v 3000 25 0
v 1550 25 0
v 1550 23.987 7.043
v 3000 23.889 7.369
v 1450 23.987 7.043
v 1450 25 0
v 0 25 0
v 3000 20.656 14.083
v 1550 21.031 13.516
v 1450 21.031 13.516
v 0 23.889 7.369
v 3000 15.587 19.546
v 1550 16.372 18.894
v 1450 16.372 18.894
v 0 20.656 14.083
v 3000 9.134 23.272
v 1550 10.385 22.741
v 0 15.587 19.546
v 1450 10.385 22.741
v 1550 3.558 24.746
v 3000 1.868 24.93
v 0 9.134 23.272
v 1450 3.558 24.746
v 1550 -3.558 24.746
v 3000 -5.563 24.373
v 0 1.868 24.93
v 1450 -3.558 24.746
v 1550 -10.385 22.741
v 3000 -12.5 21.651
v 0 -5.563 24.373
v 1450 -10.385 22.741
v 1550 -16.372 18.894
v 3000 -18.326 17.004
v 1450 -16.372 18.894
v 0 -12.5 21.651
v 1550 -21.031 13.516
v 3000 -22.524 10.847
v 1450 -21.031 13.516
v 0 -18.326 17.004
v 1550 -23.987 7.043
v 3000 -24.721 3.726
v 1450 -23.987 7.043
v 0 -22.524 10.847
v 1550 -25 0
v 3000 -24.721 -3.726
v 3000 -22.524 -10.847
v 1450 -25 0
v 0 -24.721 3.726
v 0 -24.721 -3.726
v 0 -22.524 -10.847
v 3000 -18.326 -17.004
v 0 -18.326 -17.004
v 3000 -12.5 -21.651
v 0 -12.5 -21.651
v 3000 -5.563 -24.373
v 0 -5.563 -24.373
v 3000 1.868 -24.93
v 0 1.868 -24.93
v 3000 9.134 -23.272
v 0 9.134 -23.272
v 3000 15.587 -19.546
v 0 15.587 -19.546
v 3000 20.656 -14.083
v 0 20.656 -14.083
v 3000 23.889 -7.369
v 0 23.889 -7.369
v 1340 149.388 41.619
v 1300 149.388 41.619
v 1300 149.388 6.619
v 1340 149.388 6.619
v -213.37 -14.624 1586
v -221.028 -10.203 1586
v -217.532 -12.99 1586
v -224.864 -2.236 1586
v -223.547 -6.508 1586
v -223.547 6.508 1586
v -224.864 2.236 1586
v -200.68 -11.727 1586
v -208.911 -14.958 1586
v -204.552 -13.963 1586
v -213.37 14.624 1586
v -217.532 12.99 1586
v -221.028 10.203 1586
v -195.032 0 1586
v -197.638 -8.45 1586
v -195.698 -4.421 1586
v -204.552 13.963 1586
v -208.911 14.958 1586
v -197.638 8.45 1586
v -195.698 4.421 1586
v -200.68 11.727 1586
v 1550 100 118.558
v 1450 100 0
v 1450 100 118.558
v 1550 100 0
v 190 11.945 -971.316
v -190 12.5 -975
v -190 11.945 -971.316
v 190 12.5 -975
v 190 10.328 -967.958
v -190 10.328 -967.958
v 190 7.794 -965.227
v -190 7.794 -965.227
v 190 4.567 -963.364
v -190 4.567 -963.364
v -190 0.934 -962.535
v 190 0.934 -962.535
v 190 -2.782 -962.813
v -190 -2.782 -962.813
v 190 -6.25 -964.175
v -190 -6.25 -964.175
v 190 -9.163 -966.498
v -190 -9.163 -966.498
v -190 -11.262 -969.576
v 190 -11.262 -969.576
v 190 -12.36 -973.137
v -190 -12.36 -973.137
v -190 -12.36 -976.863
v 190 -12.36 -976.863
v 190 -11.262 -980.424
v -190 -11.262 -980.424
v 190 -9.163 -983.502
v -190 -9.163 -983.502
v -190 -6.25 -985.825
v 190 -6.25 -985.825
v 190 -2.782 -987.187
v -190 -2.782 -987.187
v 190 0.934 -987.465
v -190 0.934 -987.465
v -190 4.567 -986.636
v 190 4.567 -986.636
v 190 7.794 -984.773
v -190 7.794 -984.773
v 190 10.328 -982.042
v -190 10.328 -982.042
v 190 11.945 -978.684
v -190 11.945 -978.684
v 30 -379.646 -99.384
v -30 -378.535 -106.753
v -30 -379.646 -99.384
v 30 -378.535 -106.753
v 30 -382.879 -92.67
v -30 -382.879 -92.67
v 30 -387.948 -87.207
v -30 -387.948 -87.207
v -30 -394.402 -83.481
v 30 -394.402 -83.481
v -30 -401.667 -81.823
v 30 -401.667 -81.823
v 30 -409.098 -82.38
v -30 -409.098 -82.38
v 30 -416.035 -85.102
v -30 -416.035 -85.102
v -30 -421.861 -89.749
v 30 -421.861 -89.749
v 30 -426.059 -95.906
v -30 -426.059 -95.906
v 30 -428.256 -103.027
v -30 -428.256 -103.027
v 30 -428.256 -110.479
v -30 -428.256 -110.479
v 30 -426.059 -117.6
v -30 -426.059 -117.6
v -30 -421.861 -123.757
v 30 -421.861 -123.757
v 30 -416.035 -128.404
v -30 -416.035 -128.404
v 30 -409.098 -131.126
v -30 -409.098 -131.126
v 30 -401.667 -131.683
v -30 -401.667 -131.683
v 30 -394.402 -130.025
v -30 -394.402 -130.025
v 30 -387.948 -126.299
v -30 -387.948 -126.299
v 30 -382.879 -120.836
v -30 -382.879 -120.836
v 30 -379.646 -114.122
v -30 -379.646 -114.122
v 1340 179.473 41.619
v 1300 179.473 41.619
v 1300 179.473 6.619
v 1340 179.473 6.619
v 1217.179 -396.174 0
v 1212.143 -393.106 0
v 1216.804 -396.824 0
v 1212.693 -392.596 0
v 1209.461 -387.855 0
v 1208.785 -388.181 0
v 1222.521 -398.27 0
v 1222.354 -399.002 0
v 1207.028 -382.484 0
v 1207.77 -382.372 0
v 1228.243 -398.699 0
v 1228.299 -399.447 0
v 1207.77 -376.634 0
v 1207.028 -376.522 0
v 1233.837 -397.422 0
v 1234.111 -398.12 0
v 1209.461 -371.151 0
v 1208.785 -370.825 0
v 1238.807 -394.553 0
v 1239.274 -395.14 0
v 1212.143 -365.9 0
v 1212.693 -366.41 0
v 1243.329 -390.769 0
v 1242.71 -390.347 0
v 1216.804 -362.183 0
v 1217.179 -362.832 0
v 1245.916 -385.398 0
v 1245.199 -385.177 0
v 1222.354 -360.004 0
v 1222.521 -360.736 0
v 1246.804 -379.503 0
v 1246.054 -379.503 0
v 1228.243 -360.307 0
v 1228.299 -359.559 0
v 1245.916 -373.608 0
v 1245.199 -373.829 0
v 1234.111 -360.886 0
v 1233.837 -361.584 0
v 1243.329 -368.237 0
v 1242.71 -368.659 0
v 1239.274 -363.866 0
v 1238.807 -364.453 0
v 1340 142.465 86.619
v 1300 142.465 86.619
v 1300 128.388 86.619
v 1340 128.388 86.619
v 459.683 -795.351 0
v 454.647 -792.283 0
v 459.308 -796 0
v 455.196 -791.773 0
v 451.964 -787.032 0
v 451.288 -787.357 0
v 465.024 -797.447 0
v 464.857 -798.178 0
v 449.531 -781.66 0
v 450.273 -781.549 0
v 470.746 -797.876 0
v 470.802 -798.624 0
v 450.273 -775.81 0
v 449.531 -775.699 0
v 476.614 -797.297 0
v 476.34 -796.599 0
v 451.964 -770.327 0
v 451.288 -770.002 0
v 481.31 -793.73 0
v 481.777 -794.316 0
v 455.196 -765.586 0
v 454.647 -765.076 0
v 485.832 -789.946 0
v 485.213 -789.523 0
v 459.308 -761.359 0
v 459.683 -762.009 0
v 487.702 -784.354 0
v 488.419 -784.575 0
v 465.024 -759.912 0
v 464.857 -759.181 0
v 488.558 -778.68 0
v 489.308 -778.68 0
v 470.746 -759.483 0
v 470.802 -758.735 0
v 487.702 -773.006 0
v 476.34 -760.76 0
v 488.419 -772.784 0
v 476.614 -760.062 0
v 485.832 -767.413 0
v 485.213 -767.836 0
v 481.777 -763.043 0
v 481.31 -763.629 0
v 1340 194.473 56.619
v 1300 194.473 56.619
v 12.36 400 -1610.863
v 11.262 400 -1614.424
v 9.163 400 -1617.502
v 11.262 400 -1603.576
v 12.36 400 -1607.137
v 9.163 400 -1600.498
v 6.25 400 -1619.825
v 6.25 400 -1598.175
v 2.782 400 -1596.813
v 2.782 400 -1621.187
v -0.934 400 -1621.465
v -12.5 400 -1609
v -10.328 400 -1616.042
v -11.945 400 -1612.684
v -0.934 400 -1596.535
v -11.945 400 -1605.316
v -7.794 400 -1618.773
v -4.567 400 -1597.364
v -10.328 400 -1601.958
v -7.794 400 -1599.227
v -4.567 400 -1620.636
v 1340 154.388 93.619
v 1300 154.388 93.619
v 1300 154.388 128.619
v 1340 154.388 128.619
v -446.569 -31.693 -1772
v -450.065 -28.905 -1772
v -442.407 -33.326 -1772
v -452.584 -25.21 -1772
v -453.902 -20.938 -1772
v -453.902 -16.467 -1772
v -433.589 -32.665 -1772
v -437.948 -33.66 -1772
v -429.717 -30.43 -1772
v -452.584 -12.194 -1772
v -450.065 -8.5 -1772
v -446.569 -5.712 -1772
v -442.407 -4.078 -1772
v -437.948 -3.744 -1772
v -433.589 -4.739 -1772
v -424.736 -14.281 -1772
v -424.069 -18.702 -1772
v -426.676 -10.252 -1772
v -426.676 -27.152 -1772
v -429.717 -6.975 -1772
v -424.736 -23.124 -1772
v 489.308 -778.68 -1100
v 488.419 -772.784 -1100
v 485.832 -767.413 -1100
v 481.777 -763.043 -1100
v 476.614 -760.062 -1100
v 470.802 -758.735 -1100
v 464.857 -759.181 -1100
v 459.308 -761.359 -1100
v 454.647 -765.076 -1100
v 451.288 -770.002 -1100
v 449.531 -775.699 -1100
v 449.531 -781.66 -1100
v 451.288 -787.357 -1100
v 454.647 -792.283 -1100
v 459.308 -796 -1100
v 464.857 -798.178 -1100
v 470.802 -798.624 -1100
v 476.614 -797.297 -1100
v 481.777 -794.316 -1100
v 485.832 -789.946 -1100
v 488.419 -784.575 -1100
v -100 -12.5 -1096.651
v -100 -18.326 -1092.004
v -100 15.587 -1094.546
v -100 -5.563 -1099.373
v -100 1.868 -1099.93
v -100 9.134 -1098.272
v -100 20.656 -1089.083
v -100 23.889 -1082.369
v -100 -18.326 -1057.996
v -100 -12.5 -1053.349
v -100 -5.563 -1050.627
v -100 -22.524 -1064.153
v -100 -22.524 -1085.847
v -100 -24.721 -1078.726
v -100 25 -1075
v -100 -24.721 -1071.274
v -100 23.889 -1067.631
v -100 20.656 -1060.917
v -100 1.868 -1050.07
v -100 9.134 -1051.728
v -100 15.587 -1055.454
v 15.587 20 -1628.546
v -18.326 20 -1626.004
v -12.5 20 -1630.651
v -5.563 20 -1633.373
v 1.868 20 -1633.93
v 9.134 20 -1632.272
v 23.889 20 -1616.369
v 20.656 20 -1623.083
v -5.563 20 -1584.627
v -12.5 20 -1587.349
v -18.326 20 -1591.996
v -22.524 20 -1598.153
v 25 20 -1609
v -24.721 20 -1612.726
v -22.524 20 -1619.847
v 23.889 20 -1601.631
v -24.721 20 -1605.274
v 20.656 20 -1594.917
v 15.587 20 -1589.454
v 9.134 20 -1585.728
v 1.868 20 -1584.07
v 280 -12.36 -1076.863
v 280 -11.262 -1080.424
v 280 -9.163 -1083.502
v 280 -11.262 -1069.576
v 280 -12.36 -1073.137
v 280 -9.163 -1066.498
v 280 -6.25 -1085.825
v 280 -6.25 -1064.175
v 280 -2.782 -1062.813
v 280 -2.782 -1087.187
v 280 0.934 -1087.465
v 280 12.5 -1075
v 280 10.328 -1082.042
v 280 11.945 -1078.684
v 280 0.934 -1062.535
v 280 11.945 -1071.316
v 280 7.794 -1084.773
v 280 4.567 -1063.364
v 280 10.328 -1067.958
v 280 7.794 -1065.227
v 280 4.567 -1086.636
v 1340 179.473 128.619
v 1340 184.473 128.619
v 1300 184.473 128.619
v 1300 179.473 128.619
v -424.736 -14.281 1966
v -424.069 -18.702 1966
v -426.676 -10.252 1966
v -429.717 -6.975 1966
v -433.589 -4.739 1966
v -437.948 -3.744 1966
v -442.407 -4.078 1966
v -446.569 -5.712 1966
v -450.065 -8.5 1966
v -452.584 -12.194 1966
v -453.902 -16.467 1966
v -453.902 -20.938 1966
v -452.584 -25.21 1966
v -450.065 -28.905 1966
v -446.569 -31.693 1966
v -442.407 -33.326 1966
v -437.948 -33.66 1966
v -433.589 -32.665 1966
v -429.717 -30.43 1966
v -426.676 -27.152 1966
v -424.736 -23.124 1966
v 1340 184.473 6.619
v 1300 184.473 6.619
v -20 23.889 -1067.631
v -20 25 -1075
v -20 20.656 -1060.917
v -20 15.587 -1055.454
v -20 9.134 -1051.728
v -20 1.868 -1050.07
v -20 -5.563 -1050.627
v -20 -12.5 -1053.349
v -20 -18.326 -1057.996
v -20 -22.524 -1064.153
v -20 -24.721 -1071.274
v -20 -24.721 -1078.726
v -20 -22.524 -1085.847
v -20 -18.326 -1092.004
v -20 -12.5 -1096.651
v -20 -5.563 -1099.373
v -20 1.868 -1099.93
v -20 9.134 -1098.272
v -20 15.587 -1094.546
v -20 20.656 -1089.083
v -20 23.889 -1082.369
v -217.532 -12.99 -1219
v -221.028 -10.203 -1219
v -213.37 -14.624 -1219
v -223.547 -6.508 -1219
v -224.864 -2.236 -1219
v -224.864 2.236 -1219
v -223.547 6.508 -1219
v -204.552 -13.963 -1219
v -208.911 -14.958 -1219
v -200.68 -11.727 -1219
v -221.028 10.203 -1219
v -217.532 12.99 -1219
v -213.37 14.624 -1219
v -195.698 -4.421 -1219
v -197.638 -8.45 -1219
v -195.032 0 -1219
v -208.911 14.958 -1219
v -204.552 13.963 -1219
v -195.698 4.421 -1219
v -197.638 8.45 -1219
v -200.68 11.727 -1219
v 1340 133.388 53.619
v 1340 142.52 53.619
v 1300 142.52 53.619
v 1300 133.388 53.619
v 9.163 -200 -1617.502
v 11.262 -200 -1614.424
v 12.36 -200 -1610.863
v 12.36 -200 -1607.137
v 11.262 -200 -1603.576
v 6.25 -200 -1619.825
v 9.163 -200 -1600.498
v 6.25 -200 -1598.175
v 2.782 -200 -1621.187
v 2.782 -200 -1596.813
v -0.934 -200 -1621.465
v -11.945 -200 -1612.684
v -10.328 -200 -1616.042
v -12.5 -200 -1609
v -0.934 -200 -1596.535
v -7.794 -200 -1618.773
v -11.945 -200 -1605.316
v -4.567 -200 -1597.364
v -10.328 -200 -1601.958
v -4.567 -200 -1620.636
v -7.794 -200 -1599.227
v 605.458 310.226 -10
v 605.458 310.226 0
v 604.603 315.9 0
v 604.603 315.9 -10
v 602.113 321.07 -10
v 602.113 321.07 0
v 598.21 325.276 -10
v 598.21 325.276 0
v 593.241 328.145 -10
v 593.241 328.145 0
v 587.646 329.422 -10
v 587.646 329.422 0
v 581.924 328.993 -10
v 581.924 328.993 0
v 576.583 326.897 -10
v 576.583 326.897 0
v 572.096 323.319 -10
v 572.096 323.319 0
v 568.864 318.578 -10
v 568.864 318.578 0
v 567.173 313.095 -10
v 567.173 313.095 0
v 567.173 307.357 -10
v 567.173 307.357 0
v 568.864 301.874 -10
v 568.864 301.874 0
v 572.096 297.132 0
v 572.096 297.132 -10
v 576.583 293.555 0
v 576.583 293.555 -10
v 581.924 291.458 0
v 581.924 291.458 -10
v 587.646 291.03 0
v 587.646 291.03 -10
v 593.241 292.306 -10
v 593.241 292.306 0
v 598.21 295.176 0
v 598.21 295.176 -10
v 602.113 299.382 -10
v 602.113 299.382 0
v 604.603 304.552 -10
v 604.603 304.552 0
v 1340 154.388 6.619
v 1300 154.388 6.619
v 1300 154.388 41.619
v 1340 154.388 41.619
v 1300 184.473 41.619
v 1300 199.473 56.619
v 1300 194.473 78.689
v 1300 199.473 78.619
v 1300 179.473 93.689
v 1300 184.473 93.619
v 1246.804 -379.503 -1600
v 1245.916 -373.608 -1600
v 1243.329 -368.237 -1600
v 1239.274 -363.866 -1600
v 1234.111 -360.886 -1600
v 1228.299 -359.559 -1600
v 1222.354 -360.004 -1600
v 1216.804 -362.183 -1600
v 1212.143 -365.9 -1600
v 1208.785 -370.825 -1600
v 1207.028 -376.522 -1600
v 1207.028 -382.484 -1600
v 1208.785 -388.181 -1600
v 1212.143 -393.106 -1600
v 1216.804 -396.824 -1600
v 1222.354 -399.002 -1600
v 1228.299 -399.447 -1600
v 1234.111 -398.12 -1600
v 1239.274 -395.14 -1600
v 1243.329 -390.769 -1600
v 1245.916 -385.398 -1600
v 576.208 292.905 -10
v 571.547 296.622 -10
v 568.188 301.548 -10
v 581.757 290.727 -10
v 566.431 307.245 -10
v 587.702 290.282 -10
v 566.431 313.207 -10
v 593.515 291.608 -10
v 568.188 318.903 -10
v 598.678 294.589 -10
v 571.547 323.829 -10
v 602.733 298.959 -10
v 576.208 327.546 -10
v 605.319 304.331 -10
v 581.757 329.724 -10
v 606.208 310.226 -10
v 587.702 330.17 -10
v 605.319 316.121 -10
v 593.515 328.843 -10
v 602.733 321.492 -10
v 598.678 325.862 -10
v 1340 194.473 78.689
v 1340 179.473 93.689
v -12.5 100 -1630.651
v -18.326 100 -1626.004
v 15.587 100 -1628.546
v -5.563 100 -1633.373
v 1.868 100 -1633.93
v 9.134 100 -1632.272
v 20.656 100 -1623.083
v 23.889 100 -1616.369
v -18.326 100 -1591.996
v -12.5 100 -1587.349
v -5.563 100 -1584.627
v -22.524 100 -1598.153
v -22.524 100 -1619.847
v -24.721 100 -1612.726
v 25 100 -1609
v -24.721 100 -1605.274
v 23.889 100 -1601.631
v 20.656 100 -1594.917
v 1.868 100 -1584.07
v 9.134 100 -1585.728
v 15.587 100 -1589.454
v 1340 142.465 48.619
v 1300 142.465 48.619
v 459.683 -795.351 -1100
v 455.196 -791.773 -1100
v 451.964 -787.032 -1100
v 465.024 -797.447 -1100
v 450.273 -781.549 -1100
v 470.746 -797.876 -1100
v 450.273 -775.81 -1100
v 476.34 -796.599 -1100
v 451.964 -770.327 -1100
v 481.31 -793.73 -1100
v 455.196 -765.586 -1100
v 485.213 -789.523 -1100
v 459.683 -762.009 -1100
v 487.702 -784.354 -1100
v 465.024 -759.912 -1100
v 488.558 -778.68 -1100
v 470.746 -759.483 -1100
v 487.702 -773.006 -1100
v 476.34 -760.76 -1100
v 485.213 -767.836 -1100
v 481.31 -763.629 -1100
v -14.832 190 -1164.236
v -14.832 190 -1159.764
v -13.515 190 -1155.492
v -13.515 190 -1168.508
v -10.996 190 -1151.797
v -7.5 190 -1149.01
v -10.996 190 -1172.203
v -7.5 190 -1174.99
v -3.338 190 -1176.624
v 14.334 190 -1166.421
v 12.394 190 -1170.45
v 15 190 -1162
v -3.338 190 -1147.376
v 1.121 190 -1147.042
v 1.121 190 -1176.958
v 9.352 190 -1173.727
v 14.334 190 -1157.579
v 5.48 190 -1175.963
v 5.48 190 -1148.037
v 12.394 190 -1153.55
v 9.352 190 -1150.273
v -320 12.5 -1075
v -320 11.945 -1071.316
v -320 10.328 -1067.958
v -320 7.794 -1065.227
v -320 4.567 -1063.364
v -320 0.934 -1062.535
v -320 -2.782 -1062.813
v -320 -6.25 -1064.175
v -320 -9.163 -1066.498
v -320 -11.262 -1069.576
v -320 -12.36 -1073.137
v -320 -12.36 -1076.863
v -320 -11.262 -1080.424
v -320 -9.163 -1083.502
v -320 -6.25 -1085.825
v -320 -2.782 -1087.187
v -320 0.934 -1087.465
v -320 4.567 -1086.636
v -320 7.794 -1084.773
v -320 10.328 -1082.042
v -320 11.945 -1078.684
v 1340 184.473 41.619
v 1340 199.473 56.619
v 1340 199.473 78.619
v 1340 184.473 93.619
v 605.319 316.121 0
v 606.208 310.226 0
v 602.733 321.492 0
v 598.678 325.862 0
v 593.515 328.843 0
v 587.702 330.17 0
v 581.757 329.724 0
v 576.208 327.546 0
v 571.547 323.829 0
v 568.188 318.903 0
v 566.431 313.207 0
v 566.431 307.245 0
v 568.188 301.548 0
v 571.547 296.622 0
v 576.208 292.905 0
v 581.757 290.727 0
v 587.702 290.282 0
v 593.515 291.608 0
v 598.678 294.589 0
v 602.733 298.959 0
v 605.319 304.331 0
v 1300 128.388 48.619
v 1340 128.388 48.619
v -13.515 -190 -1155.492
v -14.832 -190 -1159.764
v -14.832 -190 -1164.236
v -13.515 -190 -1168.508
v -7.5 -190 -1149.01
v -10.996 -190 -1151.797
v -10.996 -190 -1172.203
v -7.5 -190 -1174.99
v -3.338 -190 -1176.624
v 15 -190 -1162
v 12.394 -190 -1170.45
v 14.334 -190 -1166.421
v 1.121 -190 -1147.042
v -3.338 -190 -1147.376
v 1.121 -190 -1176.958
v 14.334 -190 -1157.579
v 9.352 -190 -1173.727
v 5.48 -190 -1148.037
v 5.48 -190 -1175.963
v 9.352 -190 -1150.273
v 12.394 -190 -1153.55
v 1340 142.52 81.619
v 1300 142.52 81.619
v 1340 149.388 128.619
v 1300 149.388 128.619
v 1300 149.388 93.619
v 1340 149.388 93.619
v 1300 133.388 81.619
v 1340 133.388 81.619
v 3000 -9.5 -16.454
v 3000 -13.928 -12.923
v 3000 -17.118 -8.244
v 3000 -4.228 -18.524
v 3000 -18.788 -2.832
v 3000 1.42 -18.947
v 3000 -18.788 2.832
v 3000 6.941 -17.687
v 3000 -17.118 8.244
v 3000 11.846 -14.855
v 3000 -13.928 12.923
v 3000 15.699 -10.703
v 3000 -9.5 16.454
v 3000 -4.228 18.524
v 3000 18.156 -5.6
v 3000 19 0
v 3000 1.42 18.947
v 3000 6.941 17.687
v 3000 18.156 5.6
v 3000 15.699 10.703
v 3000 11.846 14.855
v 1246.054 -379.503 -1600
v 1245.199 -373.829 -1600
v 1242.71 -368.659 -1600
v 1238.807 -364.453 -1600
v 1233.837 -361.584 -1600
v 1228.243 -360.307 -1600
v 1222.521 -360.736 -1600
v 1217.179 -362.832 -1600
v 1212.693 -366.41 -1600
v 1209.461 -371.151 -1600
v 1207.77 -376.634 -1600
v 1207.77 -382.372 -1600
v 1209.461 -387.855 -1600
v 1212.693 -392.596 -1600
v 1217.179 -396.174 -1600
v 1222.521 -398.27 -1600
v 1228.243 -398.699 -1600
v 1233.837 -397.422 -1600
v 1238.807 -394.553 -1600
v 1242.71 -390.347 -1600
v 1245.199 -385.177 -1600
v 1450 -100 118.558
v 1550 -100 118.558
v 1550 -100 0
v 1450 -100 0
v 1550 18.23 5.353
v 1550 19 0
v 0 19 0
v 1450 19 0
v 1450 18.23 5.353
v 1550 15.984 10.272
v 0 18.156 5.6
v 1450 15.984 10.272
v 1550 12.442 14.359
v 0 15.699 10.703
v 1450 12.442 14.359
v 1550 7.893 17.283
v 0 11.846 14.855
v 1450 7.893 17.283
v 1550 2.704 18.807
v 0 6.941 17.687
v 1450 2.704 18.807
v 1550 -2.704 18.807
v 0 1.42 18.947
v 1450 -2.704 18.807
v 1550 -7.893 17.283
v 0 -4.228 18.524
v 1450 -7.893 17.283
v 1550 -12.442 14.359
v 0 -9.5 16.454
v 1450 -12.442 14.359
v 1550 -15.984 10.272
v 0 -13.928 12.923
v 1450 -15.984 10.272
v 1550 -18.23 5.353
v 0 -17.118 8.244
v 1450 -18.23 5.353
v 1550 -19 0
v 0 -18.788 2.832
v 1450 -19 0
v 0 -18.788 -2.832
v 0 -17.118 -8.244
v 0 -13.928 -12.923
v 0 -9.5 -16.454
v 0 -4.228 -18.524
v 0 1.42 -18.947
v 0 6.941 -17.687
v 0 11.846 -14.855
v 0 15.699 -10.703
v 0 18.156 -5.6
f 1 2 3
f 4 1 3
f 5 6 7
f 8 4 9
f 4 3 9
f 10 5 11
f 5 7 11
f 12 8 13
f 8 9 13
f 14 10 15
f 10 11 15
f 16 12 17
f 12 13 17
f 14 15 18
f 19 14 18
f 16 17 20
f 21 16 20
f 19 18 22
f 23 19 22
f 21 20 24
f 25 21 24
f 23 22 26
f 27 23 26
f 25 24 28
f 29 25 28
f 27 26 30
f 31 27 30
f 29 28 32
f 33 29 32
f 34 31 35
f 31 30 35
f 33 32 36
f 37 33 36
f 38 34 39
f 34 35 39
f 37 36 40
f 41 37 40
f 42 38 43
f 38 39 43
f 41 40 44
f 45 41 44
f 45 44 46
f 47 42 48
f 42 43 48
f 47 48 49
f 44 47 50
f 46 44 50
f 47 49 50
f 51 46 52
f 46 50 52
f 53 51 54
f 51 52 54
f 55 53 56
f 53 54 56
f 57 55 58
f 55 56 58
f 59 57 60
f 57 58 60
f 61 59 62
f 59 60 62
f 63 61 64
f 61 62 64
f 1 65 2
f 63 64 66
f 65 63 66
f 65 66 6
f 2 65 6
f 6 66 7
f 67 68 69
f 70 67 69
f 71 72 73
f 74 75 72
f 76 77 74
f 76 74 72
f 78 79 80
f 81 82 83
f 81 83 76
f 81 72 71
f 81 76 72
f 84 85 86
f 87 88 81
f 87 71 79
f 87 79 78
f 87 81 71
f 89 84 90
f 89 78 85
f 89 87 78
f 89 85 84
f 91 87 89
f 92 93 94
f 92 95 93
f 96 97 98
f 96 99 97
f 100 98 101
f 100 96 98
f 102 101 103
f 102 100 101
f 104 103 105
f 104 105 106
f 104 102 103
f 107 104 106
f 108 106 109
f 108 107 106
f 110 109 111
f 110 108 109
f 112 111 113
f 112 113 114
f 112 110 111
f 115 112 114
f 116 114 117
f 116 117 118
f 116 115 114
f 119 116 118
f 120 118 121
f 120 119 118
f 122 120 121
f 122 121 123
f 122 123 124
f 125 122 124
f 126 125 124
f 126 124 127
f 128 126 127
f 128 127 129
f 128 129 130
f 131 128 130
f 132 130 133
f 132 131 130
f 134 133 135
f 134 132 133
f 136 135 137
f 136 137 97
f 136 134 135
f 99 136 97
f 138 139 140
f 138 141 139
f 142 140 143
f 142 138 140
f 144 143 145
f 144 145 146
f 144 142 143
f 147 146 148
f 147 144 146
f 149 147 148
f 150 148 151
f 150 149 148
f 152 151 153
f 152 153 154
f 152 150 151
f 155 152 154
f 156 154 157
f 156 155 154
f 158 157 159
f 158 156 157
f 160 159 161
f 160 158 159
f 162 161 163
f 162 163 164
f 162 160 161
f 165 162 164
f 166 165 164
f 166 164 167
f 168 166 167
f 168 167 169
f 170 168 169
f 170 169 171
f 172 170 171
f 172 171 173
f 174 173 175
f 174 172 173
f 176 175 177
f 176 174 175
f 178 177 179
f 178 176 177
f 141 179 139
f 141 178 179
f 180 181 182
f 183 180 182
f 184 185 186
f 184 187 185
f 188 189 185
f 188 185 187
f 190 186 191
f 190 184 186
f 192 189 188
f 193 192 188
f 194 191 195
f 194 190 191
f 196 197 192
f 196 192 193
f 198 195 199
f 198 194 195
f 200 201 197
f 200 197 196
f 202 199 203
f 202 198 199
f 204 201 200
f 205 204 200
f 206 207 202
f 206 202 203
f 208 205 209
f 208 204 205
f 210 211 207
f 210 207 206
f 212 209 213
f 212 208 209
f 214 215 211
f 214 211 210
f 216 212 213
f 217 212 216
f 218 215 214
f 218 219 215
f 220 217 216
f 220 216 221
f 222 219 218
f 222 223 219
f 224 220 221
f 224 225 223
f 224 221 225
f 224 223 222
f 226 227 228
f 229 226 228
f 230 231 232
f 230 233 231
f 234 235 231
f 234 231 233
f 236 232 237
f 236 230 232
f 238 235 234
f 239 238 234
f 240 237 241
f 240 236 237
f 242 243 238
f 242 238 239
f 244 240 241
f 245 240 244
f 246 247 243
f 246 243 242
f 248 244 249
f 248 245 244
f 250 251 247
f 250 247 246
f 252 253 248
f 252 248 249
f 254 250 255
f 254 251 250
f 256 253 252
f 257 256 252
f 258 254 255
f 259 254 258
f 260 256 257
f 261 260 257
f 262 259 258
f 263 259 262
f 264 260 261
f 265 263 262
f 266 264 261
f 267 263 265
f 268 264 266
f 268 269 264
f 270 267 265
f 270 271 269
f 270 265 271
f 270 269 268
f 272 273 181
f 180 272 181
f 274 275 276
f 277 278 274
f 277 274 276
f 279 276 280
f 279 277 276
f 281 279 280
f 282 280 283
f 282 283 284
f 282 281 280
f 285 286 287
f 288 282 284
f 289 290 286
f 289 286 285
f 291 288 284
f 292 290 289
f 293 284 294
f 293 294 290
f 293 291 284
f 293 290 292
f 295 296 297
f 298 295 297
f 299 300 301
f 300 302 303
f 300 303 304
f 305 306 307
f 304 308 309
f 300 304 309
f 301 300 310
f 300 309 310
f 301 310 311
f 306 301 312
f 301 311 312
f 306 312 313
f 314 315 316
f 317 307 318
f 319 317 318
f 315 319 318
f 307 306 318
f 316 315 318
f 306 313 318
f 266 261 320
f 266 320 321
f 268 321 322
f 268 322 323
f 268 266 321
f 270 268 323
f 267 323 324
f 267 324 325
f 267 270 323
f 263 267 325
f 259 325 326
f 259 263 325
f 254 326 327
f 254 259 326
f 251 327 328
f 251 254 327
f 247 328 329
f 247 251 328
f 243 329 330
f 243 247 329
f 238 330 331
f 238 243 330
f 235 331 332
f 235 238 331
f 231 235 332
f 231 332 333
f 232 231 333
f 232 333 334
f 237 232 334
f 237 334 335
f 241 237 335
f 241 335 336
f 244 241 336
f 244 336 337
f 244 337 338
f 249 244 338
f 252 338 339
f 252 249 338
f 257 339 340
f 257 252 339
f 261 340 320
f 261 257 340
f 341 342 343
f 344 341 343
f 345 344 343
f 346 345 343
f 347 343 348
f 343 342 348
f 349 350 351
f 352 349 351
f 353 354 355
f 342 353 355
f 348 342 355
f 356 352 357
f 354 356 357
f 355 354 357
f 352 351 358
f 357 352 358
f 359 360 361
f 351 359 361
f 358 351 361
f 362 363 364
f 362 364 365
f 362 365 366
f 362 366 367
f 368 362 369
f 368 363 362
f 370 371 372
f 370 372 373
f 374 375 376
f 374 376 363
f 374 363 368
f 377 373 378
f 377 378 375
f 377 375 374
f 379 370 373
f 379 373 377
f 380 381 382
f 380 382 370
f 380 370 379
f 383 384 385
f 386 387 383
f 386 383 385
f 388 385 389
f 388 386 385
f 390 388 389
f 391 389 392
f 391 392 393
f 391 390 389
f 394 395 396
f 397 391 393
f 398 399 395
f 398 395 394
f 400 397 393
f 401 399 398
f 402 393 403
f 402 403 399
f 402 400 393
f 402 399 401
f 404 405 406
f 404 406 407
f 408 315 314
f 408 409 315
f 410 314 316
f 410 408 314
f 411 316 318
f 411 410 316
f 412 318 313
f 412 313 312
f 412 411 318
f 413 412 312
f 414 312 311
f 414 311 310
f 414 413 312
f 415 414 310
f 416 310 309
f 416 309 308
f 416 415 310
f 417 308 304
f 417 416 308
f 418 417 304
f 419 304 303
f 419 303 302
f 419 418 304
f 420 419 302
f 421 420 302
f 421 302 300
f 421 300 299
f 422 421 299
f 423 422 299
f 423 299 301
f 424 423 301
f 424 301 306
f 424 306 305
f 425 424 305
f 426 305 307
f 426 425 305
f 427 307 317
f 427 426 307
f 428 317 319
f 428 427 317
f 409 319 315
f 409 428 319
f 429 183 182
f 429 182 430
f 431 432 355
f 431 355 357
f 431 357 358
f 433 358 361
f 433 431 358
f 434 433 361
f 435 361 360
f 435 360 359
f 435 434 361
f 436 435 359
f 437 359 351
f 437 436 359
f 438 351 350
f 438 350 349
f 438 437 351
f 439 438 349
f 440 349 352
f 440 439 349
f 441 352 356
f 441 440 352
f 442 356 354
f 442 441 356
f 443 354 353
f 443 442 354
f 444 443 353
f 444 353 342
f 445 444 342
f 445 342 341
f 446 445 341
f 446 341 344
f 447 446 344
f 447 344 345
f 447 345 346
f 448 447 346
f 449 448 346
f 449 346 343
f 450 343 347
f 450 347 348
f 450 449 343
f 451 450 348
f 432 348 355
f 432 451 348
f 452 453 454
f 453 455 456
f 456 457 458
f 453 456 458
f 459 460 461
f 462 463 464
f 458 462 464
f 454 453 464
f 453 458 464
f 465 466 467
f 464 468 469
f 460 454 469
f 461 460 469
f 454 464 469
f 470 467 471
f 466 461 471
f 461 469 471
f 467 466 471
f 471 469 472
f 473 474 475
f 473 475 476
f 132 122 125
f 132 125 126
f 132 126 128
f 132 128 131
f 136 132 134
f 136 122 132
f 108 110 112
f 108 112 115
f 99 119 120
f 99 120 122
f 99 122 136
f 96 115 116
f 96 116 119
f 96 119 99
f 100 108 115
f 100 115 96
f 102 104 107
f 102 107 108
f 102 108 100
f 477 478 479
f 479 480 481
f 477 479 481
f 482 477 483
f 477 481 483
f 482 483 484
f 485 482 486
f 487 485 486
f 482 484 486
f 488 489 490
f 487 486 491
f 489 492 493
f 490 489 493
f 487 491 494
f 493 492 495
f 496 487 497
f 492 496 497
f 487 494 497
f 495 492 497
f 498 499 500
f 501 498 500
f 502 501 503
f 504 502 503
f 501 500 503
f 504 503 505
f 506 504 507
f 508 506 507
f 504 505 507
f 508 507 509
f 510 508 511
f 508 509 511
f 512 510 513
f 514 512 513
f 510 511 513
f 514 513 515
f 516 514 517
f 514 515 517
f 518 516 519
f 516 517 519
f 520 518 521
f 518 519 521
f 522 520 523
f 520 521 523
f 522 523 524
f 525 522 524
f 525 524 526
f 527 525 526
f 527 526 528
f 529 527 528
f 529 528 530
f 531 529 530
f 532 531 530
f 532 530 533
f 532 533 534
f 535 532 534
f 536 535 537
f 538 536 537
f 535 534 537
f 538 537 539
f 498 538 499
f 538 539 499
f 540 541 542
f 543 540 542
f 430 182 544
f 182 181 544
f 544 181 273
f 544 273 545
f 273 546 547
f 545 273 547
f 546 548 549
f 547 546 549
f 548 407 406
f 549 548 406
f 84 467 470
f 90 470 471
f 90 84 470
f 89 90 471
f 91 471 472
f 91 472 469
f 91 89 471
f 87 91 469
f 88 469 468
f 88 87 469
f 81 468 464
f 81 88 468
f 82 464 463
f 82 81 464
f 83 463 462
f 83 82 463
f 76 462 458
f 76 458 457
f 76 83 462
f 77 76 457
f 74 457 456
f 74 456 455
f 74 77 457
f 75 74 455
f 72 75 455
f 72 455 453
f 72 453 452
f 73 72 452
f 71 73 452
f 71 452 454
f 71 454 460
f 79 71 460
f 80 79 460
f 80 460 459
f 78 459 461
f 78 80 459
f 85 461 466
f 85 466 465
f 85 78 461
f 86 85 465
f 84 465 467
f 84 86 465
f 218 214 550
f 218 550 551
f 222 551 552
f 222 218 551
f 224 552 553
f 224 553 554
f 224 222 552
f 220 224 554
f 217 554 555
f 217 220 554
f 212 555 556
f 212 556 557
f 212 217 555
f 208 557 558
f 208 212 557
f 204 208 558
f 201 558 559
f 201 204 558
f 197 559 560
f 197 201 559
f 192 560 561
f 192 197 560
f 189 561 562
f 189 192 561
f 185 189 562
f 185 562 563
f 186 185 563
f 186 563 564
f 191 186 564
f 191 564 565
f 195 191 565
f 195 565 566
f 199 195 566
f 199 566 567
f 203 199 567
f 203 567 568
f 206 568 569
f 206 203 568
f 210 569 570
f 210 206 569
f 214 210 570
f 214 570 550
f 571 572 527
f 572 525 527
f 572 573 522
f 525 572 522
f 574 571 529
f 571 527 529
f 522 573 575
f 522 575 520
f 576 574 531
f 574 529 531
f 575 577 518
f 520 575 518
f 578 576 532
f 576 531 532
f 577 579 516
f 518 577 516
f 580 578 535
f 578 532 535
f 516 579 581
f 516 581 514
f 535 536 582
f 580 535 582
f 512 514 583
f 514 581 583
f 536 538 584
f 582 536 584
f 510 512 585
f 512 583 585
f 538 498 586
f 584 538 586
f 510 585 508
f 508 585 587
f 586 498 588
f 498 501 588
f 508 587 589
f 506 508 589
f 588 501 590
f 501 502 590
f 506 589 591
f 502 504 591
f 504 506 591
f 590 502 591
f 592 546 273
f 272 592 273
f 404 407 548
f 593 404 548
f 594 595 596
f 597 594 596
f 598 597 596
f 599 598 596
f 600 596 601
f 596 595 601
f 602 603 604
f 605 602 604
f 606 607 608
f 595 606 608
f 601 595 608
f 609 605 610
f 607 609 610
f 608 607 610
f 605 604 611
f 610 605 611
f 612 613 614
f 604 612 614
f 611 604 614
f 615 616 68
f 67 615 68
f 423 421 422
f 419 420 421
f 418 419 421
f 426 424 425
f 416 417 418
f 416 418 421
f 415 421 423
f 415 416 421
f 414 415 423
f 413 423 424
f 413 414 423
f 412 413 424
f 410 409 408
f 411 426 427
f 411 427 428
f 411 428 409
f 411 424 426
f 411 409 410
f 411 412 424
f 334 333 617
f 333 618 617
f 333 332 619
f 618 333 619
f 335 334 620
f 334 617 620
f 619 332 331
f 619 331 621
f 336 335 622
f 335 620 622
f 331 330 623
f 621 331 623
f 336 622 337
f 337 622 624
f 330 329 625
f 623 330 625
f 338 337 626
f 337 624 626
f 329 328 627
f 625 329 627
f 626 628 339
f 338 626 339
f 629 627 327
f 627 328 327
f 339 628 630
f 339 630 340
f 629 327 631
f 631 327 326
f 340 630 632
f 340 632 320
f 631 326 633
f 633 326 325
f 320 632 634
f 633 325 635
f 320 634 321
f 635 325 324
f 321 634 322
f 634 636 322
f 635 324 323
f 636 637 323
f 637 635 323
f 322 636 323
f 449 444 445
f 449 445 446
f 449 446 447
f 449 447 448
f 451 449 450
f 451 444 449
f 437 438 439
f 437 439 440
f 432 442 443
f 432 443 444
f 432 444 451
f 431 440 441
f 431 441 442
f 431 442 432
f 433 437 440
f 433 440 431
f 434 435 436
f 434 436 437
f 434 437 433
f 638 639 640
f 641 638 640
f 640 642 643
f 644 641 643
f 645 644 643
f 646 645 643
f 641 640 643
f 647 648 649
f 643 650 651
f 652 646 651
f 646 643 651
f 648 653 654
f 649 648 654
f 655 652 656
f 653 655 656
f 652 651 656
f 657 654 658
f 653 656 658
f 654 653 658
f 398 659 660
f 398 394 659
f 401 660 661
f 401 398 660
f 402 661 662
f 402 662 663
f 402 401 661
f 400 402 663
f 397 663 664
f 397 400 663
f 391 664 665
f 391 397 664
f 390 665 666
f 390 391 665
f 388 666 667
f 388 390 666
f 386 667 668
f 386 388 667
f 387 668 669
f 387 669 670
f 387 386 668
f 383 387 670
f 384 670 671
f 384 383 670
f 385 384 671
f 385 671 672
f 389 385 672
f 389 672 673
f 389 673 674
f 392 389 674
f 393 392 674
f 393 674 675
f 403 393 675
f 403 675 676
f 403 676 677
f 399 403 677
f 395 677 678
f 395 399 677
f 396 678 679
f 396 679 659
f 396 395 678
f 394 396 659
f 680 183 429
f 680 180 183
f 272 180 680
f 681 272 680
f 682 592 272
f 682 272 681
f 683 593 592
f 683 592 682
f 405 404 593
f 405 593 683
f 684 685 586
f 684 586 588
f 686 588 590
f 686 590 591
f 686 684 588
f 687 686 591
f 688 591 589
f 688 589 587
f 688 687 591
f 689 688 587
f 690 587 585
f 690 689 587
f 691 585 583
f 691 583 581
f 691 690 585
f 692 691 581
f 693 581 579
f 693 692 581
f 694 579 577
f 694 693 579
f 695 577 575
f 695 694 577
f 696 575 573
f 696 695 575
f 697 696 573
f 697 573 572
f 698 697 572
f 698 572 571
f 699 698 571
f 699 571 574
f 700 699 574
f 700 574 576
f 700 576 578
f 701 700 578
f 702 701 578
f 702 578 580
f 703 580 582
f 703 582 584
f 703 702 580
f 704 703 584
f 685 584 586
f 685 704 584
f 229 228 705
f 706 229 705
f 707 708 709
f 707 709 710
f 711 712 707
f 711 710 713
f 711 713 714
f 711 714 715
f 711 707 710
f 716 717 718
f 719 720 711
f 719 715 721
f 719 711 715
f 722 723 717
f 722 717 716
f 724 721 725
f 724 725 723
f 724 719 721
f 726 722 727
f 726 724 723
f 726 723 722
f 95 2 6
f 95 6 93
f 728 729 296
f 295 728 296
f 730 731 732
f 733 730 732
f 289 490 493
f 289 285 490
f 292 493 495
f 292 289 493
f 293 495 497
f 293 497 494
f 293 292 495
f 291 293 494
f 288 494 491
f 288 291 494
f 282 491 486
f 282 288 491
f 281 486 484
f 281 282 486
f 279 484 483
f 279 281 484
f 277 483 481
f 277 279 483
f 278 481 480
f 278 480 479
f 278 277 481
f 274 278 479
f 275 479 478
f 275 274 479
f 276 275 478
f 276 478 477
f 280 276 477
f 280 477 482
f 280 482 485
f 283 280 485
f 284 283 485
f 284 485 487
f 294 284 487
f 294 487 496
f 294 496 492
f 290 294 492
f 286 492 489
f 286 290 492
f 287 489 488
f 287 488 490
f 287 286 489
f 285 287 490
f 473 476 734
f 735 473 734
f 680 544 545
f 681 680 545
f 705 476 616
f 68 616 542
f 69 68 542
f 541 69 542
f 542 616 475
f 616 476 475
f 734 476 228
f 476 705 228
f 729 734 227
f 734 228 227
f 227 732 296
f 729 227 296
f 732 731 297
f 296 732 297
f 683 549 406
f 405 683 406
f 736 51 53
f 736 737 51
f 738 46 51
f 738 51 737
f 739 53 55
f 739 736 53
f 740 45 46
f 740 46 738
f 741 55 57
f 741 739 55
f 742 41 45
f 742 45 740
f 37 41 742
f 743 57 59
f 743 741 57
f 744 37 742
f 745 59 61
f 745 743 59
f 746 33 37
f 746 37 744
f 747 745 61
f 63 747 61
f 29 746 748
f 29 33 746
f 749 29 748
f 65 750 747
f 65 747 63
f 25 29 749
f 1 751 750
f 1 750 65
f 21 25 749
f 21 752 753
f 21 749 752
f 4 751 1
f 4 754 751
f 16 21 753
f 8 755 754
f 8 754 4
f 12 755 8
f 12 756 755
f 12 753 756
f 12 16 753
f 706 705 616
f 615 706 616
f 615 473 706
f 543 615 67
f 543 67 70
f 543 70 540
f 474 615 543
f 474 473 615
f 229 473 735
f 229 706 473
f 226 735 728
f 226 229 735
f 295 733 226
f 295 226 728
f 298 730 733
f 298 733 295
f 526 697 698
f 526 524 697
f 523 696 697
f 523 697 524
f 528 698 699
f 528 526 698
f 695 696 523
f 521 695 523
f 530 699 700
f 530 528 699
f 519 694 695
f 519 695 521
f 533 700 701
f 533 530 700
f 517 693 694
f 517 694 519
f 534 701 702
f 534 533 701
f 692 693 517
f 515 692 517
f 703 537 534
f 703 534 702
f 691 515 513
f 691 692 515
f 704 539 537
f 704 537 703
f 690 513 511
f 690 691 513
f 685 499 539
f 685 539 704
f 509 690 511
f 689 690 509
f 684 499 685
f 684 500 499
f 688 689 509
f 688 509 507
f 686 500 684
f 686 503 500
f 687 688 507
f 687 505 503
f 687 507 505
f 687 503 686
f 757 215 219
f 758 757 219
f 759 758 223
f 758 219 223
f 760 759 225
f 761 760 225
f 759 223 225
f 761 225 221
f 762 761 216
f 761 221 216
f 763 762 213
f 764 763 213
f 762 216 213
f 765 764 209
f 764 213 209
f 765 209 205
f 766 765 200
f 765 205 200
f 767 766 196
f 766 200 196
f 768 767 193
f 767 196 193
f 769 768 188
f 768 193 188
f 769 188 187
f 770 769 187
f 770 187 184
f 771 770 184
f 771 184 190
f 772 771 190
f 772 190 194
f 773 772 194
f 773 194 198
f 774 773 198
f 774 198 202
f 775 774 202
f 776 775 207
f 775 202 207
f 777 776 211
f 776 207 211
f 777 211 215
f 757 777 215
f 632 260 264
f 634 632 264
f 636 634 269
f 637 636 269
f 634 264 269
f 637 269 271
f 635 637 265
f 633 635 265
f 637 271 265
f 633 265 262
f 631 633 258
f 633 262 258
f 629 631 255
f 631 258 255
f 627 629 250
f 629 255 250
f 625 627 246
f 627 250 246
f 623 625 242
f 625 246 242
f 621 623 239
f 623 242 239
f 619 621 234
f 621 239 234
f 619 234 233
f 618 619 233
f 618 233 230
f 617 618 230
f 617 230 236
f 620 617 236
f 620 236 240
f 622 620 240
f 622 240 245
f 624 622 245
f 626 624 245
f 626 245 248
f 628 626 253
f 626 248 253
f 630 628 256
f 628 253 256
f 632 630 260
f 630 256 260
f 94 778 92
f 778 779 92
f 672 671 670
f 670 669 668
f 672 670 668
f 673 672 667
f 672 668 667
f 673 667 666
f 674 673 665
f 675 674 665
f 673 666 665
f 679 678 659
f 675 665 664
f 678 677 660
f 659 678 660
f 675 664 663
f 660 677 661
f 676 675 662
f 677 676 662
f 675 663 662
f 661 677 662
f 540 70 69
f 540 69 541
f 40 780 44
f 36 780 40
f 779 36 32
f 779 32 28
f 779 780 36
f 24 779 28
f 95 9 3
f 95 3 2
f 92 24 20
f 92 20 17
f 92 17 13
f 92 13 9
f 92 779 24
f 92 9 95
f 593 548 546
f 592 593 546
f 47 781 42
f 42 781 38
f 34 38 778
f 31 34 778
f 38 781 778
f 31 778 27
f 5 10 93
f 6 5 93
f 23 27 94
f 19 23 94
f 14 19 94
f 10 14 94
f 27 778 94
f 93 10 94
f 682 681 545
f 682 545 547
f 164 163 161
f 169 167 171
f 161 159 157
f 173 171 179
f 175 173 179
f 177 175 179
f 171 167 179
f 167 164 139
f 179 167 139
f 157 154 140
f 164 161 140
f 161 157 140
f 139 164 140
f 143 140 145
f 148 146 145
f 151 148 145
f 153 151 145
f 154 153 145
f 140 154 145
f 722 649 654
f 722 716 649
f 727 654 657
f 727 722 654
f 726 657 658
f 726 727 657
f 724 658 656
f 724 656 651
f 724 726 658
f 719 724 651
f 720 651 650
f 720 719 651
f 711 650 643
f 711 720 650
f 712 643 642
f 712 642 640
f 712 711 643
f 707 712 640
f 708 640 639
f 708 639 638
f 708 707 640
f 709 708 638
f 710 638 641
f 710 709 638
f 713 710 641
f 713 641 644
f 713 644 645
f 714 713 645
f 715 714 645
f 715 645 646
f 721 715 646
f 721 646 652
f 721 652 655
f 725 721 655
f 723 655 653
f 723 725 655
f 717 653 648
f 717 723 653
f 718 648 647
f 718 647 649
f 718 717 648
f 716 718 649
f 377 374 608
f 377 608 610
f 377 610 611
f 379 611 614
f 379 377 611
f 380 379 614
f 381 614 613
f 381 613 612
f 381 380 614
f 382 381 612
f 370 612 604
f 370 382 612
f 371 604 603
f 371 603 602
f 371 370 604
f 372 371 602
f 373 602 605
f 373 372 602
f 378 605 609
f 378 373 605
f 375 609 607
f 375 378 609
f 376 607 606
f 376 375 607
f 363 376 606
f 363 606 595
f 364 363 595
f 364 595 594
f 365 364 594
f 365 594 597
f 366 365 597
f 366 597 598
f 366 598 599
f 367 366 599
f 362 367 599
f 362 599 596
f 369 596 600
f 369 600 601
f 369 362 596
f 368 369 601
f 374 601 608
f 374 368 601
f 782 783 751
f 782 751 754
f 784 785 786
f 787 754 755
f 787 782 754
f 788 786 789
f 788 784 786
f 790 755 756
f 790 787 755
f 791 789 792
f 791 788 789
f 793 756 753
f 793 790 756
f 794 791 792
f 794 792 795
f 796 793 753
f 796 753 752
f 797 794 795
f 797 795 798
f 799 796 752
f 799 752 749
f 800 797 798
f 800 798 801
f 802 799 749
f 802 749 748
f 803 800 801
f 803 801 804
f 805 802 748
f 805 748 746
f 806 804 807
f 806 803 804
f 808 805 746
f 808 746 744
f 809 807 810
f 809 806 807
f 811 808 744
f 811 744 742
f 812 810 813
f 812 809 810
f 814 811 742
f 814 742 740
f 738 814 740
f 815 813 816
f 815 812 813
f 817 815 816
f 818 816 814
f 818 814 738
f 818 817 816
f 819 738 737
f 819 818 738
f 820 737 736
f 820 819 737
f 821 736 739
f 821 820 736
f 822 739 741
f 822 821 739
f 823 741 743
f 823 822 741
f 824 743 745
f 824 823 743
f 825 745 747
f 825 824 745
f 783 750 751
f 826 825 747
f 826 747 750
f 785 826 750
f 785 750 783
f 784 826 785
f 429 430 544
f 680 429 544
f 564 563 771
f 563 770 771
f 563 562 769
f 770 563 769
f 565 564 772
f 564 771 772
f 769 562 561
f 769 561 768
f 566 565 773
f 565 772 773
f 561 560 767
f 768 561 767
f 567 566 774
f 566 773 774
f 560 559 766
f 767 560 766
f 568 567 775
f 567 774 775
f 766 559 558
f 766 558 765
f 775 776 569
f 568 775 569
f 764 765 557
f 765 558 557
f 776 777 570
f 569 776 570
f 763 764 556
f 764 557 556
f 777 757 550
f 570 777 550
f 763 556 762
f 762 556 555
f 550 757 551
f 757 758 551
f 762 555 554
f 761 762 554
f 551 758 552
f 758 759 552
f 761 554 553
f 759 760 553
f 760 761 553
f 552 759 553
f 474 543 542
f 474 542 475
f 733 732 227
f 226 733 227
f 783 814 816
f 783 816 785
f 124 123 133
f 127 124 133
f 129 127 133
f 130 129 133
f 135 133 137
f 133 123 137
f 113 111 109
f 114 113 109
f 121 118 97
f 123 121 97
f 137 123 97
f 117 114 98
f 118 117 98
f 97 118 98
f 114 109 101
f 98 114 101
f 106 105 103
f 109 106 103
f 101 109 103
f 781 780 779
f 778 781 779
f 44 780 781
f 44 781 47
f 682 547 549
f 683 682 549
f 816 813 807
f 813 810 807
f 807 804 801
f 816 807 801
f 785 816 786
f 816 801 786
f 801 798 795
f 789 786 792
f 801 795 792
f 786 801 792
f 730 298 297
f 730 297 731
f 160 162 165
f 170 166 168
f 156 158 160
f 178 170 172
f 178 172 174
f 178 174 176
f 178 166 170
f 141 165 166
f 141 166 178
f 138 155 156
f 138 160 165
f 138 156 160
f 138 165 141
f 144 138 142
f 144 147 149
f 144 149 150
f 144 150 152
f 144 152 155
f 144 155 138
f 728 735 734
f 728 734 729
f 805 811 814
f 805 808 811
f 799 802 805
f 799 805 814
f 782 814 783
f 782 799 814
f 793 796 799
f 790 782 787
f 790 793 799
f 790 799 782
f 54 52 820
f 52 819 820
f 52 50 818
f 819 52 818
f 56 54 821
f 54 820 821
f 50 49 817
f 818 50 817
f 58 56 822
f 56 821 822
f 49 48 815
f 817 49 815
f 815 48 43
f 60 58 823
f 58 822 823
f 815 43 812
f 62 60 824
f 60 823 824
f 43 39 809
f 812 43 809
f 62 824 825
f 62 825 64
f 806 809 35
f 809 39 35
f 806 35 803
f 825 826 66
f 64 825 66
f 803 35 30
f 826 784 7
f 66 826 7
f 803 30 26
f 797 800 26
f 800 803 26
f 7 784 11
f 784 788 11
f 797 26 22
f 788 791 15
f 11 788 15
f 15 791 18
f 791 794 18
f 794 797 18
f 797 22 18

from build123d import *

# Parameters (mm, degrees)
F0_R           = 25
F0_R_2         = 19
F1_DEPTH       = 3000
F3_W           = 200
F3_H           = 118.5581170488
F4_DEPTH       = 50
F4_DEPTH_BACK  = 50
F5_R           = 15
F6_DEPTH       = 1966
F6_DEPTH_BACK  = 1772
F9_START       = -20
F8_R           = 25
F9_DEPTH       = 80
F10_R          = 12.5
F11_DEPTH      = 300
F11_DEPTH_BACK = 300
F14_START      = -20
F13_R          = 25
F14_DEPTH      = 80
F15_R          = 12.5
F16_DEPTH      = 300
F16_DEPTH_BACK = 300
F19_DEPTH      = 40
F20_R          = 20
F20_R_2        = 19.25
F21_DEPTH      = 1600
F22_R          = 15
F23_DEPTH      = 1586
F23_DEPTH_BACK = 1219
F25_R          = 12.5
F26_DEPTH      = 190
F26_DEPTH_BACK = 190
F28_R          = 15
F29_DEPTH      = 190
F29_DEPTH_BACK = 190
F30_R          = 25
F31_DEPTH      = 30
F31_DEPTH_BACK = 30
F32_R          = 20
F32_R_2        = 19.25
F33_DEPTH      = 1100
F34_R          = 20
F34_R_2        = 19.25
F35_DEPTH      = 10


with BuildPart() as f1:
    # F0 (on Right) → F1 (new body)
    with BuildSketch(Plane.YZ):
        Circle(F0_R)
        Circle(F0_R_2, mode=Mode.SUBTRACT)
    extrude(amount=F1_DEPTH)

    # F3 (on offset) → F4 (join, two sides)
    with BuildSketch(Plane.YZ.offset(1500)) as f4_sk:
        with Locations((0, 59.2790585244)):
            Rectangle(F3_W, F3_H)
    extrude(amount=F4_DEPTH)
    extrude(f4_sk.sketch, amount=-F4_DEPTH_BACK)


with BuildPart() as f6:
    # F5 (on Top) → F6 (new body, two sides)
    with BuildSketch(Plane.XY) as f6_sk:
        with Locations((-439.0692710876, -18.7022052705)):
            Circle(F5_R)
    extrude(amount=F6_DEPTH)
    extrude(f6_sk.sketch, amount=-F6_DEPTH_BACK)


with BuildPart() as f9:
    # F8 (on Front) → F9 (new body)
    with BuildSketch(Plane.XZ.offset(F9_START)):
        with Locations((0, -1609)):
            Circle(F8_R)
    extrude(amount=-F9_DEPTH)


with BuildPart() as f11:
    # F10 (on face) → F11 (new body, two sides)
    with BuildSketch(Plane(origin=(0, 100, 0), x_dir=(-1, 0, 0), z_dir=(0, 1, 0))) as f11_sk:
        with Locations((0, -1609)):
            Circle(F10_R)
    extrude(amount=F11_DEPTH)
    extrude(f11_sk.sketch, amount=-F11_DEPTH_BACK)


with BuildPart() as f14:
    # F13 (on Right) → F14 (new body)
    with BuildSketch(Plane.YZ.offset(F14_START)):
        with Locations((0, -1075)):
            Circle(F13_R)
    extrude(amount=-F14_DEPTH)


with BuildPart() as f16:
    # F15 (on face) → F16 (new body, two sides)
    with BuildSketch(Plane.YZ.offset(-20)) as f16_sk:
        with Locations((0, -1075)):
            Circle(F15_R)
    extrude(amount=F16_DEPTH)
    extrude(f16_sk.sketch, amount=-F16_DEPTH_BACK)


with BuildPart() as f19:
    # F18 (on offset) → F19 (new body)
    with BuildSketch(Plane.YZ.offset(1300)):
        Polygon((179.47330858, 6.6190533715), (184.47330858, 6.6190533715), (184.47330858, 41.6190533715), (199.47330858, 56.6190533715), (199.47330858, 78.6190533715), (184.47330858, 93.6190533715), (184.47330858, 128.6190533715), (179.47330858, 128.6190533715), (179.47330858, 93.6887386519), (194.47330858, 78.6887386519), (194.47330858, 56.6190533715), (179.47330858, 41.6190533715), align=None)
    extrude(amount=F19_DEPTH)


with BuildPart() as f19b:
    # F18 (on offset) → F19, piece 2 (new body)
    with BuildSketch(Plane.YZ.offset(1300)):
        Polygon((142.5195689979, 81.6190533715), (154.387590967, 93.6190533715), (154.387590967, 128.6190533715), (149.387590967, 128.6190533715), (149.387590967, 93.6190533715), (142.4645781517, 86.6190533715), (128.387590967, 86.6190533715), (128.387590967, 48.6190533715), (142.4645781517, 48.6190533715), (149.387590967, 41.6190533715), (149.387590967, 6.6190533715), (154.387590967, 6.6190533715), (154.387590967, 41.6190533715), (142.5195689979, 53.6190533715), (133.387590967, 53.6190533715), (133.387590967, 81.6190533715), align=None)
    extrude(amount=F19_DEPTH)


with BuildPart() as f21:
    # F20 (on Top) → F21 (new body)
    with BuildSketch(Plane.XY):
        with Locations((1226.8044948578, -379.5030117035)):
            Circle(F20_R)
        with Locations((1226.8044948578, -379.5030117035)):
            Circle(F20_R_2, mode=Mode.SUBTRACT)
    extrude(amount=-F21_DEPTH)


with BuildPart() as f23:
    # F22 (on Top) → F23 (new body, two sides)
    with BuildSketch(Plane.XY) as f23_sk:
        with Locations((-210.0320160389, 0)):
            Circle(F22_R)
    extrude(amount=F23_DEPTH)
    extrude(f23_sk.sketch, amount=-F23_DEPTH_BACK)


with BuildPart() as f26:
    # F25 (on Right) → F26 (new body, two sides)
    with BuildSketch(Plane.YZ) as f26_sk:
        with Locations((0, -975)):
            Circle(F25_R)
    extrude(amount=F26_DEPTH)
    extrude(f26_sk.sketch, amount=-F26_DEPTH_BACK)


with BuildPart() as f29:
    # F28 (on Front) → F29 (new body, two sides)
    with BuildSketch(Plane.XZ) as f29_sk:
        with Locations((0, -1162)):
            Circle(F28_R)
    extrude(amount=F29_DEPTH)
    extrude(f29_sk.sketch, amount=-F29_DEPTH_BACK)


with BuildPart() as f31:
    # F30 (on Right) → F31 (new body, two sides)
    with BuildSketch(Plane.YZ) as f31_sk:
        with Locations((-403.5350382328, -106.7529991269)):
            Circle(F30_R)
    extrude(amount=F31_DEPTH)
    extrude(f31_sk.sketch, amount=-F31_DEPTH_BACK)


with BuildPart() as f33:
    # F32 (on Top) → F33 (new body)
    with BuildSketch(Plane.XY):
        with Locations((469.3075716496, -778.6795496941)):
            Circle(F32_R)
        with Locations((469.3075716496, -778.6795496941)):
            Circle(F32_R_2, mode=Mode.SUBTRACT)
    extrude(amount=-F33_DEPTH)


with BuildPart() as f35:
    # F34 (on Top) → F35 (new body)
    with BuildSketch(Plane.XY):
        with Locations((586.2077474594, 310.2257847786)):
            Circle(F34_R)
        with Locations((586.2077474594, 310.2257847786)):
            Circle(F34_R_2, mode=Mode.SUBTRACT)
    extrude(amount=-F35_DEPTH)


solid = Compound([f1.part, f6.part, f9.part, f11.part, f14.part, f16.part, f19.part, f19b.part, f21.part, f23.part, f26.part, f29.part, f31.part, f33.part, f35.part])
